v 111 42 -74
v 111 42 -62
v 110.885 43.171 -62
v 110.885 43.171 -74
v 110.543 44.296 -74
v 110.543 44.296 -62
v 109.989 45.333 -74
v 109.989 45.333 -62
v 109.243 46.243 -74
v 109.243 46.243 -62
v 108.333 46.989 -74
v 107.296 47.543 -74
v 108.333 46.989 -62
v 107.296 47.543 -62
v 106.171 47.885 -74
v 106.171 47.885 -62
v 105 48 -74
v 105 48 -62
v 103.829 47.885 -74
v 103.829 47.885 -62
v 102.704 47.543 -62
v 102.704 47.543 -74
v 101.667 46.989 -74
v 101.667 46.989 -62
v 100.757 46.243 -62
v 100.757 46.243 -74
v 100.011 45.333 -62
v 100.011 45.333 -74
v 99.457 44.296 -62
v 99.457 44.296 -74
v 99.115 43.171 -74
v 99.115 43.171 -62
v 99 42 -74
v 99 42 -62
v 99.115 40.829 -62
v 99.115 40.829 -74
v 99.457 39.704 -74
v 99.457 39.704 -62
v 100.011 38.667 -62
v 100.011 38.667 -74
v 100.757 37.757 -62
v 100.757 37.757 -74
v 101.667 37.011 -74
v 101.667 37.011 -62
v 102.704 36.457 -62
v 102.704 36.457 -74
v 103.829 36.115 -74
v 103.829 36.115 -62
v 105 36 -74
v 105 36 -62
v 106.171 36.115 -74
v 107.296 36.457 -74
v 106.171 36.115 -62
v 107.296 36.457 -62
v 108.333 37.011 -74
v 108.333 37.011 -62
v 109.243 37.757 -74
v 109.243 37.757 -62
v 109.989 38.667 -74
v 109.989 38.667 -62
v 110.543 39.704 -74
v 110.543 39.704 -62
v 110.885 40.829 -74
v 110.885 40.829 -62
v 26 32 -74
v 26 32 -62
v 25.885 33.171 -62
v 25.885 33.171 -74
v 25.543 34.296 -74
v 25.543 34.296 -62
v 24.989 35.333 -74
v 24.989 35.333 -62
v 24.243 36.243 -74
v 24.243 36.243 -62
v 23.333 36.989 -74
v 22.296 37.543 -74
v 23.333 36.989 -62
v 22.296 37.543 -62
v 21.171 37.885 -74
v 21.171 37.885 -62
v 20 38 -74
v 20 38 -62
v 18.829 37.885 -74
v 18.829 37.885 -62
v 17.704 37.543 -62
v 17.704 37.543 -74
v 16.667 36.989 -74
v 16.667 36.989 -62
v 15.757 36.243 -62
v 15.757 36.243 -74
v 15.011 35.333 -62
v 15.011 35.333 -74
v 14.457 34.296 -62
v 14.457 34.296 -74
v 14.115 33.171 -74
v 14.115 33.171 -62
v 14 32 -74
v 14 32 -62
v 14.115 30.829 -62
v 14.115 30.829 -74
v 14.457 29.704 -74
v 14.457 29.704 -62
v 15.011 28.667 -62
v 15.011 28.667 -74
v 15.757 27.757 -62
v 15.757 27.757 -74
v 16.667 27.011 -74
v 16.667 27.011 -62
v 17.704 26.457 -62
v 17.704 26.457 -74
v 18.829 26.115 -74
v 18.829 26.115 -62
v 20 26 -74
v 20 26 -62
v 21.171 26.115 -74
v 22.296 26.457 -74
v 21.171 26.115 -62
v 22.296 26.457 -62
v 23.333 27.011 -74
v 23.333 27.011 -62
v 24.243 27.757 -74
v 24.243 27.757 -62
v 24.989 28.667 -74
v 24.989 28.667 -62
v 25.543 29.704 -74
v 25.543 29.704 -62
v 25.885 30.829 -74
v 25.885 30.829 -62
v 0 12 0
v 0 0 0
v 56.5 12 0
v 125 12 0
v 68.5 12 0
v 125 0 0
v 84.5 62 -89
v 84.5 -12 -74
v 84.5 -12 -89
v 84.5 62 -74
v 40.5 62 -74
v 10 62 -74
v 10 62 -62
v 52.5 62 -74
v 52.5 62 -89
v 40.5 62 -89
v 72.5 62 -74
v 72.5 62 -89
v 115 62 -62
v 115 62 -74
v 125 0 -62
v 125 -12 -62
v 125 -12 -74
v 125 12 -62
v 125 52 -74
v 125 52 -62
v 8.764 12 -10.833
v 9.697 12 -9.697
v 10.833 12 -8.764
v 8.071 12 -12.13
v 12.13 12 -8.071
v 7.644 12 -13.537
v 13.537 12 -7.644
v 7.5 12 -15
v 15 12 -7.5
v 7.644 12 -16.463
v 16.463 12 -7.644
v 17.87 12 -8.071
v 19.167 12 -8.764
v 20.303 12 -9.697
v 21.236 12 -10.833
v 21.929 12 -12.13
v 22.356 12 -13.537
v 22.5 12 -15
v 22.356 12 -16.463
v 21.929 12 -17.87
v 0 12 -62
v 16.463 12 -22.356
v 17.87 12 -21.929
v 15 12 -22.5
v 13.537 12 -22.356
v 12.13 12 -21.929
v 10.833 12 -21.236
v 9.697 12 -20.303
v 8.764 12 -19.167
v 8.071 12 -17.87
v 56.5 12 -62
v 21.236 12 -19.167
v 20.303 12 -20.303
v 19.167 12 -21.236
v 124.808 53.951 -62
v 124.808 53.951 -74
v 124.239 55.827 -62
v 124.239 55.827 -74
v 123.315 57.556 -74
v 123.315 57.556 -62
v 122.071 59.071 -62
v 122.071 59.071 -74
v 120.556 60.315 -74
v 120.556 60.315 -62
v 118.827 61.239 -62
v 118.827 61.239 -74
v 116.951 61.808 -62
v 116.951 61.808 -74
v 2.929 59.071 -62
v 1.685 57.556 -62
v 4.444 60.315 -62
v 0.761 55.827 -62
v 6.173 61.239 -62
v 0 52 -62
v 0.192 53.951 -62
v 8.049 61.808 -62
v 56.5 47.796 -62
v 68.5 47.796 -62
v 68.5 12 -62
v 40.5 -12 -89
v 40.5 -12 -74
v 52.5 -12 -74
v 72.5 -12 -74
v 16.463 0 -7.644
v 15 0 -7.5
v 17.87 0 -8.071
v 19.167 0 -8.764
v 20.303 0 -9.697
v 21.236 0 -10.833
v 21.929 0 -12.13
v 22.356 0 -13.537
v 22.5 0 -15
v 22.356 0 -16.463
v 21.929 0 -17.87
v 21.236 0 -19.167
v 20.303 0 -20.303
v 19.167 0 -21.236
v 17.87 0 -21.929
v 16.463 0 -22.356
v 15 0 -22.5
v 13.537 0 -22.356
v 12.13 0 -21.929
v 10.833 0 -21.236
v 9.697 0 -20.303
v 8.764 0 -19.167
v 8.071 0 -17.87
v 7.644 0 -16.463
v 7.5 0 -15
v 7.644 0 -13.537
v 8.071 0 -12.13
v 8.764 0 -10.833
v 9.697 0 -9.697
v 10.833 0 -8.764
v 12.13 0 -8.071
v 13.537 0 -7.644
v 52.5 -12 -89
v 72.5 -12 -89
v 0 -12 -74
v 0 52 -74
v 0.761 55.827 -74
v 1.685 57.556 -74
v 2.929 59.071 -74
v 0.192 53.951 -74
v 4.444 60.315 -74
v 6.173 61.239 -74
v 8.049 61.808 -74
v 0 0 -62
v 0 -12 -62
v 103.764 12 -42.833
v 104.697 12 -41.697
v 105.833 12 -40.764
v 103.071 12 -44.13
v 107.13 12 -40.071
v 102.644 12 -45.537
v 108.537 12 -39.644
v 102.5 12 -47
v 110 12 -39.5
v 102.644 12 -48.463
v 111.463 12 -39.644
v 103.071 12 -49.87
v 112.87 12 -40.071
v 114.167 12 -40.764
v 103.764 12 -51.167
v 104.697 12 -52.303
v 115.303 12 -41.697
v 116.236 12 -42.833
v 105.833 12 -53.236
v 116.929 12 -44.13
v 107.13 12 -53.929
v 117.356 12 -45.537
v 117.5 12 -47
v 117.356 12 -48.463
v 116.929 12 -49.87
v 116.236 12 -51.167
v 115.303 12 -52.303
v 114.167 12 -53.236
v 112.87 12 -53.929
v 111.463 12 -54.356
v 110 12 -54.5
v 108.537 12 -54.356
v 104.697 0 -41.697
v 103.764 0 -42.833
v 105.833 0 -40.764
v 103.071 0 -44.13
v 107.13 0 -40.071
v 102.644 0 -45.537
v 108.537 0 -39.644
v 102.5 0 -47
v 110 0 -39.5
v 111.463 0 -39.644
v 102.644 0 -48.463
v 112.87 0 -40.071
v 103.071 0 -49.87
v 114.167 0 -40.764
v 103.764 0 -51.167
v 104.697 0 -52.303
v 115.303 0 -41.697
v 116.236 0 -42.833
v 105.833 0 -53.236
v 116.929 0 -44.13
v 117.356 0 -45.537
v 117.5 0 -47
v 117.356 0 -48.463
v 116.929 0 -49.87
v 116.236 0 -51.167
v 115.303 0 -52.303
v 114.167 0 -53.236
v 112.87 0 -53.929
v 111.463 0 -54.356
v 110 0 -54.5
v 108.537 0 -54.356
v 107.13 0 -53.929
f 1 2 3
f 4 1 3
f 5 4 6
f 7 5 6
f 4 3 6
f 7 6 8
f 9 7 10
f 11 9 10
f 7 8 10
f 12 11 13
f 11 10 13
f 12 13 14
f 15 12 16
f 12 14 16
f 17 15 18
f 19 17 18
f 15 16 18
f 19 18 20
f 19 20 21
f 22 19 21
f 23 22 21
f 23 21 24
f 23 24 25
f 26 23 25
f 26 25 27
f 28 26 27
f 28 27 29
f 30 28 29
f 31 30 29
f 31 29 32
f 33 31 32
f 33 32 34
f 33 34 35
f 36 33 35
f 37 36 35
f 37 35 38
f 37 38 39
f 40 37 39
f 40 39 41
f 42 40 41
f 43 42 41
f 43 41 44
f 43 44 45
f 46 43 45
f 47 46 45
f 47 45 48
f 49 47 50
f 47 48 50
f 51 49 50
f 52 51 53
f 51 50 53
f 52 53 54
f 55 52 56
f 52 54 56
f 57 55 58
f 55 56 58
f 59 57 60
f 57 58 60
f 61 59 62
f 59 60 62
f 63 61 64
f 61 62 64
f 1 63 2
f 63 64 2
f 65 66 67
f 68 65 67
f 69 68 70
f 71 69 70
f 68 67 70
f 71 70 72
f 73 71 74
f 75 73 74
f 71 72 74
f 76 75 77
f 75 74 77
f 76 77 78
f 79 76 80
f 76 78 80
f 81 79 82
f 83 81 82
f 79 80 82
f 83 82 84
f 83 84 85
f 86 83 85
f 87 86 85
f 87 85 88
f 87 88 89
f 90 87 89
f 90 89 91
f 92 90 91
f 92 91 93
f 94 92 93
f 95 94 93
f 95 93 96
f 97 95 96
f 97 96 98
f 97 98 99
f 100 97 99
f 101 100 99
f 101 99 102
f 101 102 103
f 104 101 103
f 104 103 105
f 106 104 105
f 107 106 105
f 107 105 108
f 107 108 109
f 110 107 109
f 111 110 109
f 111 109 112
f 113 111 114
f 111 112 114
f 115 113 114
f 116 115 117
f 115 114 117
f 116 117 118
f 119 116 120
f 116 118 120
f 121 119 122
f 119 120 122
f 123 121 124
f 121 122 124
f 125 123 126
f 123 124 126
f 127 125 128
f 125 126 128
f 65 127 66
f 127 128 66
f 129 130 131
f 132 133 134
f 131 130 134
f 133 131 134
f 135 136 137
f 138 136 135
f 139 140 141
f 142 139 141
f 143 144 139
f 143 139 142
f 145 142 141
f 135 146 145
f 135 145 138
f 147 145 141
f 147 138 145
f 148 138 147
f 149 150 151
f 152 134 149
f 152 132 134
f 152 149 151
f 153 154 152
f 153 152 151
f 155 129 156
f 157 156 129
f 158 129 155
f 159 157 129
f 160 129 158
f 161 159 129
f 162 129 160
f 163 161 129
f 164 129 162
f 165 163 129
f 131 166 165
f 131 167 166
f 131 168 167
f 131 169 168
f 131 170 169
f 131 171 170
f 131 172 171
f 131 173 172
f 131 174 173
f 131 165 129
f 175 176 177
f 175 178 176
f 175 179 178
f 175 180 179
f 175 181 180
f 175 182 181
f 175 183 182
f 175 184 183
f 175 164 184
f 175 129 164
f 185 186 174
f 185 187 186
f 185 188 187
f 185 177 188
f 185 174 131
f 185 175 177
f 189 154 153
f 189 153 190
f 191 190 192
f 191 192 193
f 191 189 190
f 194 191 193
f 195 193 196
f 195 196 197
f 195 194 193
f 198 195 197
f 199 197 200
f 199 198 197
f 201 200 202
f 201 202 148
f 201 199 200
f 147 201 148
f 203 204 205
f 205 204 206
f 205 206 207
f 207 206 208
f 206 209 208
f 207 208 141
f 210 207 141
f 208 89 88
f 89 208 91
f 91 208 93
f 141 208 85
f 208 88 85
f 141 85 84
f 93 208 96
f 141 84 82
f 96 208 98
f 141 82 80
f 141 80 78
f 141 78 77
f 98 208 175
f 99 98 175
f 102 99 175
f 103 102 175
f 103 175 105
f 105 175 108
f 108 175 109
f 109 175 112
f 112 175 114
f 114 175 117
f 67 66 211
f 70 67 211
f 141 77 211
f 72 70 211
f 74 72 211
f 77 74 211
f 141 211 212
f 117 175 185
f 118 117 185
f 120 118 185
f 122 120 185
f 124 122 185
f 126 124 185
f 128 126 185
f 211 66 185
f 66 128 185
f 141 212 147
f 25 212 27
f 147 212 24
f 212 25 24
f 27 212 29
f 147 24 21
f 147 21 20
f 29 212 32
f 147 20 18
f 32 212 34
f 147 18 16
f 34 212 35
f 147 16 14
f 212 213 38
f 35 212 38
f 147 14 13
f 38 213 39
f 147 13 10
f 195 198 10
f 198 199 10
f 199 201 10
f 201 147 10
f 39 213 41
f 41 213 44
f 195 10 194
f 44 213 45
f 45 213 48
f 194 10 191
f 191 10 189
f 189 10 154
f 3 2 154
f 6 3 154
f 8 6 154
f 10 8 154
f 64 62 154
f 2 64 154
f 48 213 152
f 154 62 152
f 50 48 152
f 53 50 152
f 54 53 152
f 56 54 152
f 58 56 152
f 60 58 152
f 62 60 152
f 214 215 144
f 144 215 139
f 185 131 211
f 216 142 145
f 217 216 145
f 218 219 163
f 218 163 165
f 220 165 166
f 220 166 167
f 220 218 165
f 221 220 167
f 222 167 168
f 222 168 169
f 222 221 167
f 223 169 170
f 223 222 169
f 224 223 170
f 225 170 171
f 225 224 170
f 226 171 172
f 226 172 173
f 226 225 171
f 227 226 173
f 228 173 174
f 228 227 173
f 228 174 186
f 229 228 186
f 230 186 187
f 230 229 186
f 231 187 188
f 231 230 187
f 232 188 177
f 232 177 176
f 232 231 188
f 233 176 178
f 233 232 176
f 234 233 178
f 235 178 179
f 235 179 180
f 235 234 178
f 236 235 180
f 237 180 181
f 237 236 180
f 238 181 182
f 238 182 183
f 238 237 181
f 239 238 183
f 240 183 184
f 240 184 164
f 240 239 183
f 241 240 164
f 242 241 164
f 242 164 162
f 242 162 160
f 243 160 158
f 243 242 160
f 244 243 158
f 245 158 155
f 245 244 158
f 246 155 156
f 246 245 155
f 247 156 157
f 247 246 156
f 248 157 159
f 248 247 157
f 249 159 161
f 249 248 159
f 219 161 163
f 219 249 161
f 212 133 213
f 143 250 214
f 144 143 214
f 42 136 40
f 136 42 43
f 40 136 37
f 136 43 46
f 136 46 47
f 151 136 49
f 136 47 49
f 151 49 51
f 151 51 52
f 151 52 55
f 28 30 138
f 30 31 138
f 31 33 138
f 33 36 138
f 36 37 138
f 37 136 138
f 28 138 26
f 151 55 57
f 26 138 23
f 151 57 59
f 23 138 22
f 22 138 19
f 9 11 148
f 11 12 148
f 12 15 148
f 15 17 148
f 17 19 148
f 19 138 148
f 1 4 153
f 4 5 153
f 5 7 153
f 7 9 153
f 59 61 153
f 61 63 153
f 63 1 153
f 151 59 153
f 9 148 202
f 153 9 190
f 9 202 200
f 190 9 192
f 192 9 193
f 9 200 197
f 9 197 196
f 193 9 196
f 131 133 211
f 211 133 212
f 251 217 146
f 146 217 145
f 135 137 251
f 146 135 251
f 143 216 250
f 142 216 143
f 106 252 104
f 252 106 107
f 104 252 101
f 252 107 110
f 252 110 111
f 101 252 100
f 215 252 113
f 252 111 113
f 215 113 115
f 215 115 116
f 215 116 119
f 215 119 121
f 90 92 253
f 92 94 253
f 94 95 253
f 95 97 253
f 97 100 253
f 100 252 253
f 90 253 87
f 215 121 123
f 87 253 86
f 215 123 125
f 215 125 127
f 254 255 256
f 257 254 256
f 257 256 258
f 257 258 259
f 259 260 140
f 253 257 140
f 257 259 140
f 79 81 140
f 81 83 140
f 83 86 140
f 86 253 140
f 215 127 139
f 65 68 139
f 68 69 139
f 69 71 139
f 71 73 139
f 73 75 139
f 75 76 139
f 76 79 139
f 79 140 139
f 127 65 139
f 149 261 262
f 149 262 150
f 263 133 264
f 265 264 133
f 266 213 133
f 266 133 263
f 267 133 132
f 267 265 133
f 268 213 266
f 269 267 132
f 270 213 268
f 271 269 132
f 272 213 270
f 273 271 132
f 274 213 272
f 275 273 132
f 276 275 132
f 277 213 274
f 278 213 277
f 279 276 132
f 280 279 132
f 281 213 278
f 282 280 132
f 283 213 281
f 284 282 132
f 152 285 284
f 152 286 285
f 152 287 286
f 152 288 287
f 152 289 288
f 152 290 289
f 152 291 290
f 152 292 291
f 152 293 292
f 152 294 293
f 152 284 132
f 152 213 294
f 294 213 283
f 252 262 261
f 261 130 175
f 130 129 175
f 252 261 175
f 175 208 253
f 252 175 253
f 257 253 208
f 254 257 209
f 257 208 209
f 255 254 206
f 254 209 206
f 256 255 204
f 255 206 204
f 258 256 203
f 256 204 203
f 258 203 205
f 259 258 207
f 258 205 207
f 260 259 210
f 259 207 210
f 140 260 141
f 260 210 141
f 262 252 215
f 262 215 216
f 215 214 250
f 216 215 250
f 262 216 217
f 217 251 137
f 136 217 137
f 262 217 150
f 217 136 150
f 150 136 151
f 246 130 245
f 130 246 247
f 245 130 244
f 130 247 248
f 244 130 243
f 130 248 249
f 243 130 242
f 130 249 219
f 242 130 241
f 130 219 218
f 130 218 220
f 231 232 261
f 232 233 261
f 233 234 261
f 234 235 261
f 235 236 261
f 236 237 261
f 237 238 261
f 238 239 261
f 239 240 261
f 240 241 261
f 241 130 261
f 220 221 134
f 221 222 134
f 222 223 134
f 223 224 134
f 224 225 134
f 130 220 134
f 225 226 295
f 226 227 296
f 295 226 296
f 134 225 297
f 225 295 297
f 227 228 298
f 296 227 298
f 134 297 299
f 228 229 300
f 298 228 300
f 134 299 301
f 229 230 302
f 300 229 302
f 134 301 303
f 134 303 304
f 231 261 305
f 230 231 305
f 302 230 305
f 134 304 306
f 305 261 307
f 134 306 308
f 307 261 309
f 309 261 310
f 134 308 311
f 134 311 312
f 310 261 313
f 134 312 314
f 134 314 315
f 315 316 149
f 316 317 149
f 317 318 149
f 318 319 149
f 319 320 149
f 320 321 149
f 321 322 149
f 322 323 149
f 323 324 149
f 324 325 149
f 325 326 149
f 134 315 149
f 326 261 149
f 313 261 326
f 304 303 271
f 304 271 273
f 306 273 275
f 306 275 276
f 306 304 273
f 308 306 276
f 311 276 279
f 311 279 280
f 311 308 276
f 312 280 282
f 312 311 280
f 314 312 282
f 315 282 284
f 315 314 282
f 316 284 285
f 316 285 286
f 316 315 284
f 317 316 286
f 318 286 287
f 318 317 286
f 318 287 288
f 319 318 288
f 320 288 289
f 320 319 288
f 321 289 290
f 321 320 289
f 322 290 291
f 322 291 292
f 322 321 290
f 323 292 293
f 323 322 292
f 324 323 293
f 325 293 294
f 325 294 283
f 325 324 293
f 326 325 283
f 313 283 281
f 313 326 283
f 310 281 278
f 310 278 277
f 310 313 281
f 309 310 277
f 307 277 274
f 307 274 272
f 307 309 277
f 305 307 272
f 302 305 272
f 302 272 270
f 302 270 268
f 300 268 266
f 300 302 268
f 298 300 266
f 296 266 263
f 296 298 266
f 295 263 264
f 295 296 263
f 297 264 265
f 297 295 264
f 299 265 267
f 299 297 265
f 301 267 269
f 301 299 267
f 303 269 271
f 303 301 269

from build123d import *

# Parameters (mm, degrees)
SKETCH1_W           = 125
SKETCH1_H           = 62
SKETCH1_R           = 7.5
BOSS_EXTRUDE2_DEPTH = 12
SKETCH1_3_W         = 125
SKETCH1_3_H         = 12
BOSS_EXTRUDE3_DEPTH = 62
SKETCH1_4_W         = 125
SKETCH1_4_H         = 12
BOSS_EXTRUDE4_DEPTH = 12
CUT_EXTRUDE1_REACH  = 154.686
SKETCH3_R           = 6
SKETCH4_W           = 12
SKETCH4_H           = 74
BOSS_EXTRUDE5_DEPTH = 15
SKETCH5_W           = 12
SKETCH5_H           = 62
BOSS_EXTRUDE6_DEPTH = 50
CUT_EXTRUDE2_REACH  = 130.286


with BuildPart() as part:
    # Sketch1 → Boss-Extrude2 (new body)
    with BuildSketch(Plane(origin=(0, 0, 0), x_dir=(1, 0, 0), z_dir=(0, 1, 0))):
        with Locations((62.5, 31)):
            Rectangle(SKETCH1_W, SKETCH1_H)
        with Locations((15, 15)):
            Circle(SKETCH1_R, mode=Mode.SUBTRACT)
        with Locations((110, 47)):
            Circle(SKETCH1_R, mode=Mode.SUBTRACT)
    extrude(amount=BOSS_EXTRUDE2_DEPTH)

    # Sketch1<3> → Boss-Extrude3 (add)
    with BuildSketch(Plane(origin=(0, 0, 0), x_dir=(1, 0, 0), z_dir=(0, 1, 0))):
        with Locations((62.5, 68)):
            Rectangle(SKETCH1_3_W, SKETCH1_3_H)
    extrude(amount=BOSS_EXTRUDE3_DEPTH)

    # Sketch1<4> → Boss-Extrude4 (add)
    with BuildSketch(Plane(origin=(0, 0, 0), x_dir=(1, 0, 0), z_dir=(0, 1, 0))):
        with Locations((62.5, 68)):
            Rectangle(SKETCH1_4_W, SKETCH1_4_H)
    extrude(amount=-BOSS_EXTRUDE4_DEPTH)

    # Sketch3 → Cut-Extrude1 (cut, up to next)
    with BuildSketch(Plane.XY.offset(-62), mode=Mode.PRIVATE) as cut_extrude1_sk1:
        with Locations((105, 42)):
            Circle(SKETCH3_R)
    cut_extrude1_tool1 = extrude(cut_extrude1_sk1.sketch, amount=-CUT_EXTRUDE1_REACH, mode=Mode.PRIVATE) & part.part
    # Sketch3 → Cut-Extrude1 (cut, up to next)
    with BuildSketch(Plane.XY.offset(-62), mode=Mode.PRIVATE) as cut_extrude1_sk2:
        with Locations((20, 32)):
            Circle(SKETCH3_R)
    cut_extrude1_tool2 = extrude(cut_extrude1_sk2.sketch, amount=-CUT_EXTRUDE1_REACH, mode=Mode.PRIVATE) & part.part
    # Sketch3 → Cut-Extrude1 (cut, up to next)
    with BuildSketch(Plane.XY.offset(-62), mode=Mode.PRIVATE) as cut_extrude1_sk3:
        with BuildLine():
            Line((115, 62), (125, 62))
            Line((125, 62), (125, 52))
            ThreePointArc((125, 52), (122.071067812, 59.071067812), (115, 62))
        make_face()
    cut_extrude1_tool3 = extrude(cut_extrude1_sk3.sketch, amount=-CUT_EXTRUDE1_REACH, mode=Mode.PRIVATE) & part.part
    # Sketch3 → Cut-Extrude1 (cut, up to next)
    with BuildSketch(Plane.XY.offset(-62), mode=Mode.PRIVATE) as cut_extrude1_sk4:
        with BuildLine():
            Line((0, 62), (0, 52))
            ThreePointArc((0, 52), (2.928932188, 59.071067812), (10, 62))
            Line((10, 62), (0, 62))
        make_face()
    cut_extrude1_tool4 = extrude(cut_extrude1_sk4.sketch, amount=-CUT_EXTRUDE1_REACH, mode=Mode.PRIVATE) & part.part
    add(cut_extrude1_tool1.solids().sort_by_distance((105, 42, -62))[0], mode=Mode.SUBTRACT)
    add(cut_extrude1_tool2.solids().sort_by_distance((20, 32, -62))[0], mode=Mode.SUBTRACT)
    add(cut_extrude1_tool3.solids().sort_by_distance((122.766321, 59.766321, -62))[0], mode=Mode.SUBTRACT)
    add(cut_extrude1_tool4.solids().sort_by_distance((2.233679, 59.766321, -62))[0], mode=Mode.SUBTRACT)

    # Sketch4 → Boss-Extrude5 (add)
    with BuildSketch(Plane(origin=(0, 0, -74), x_dir=(-1, 0, 0), z_dir=(0, 0, -1))):
        with Locations((-78.5, 25)):
            Rectangle(SKETCH4_W, SKETCH4_H)
        with Locations((-46.5, 25)):
            Rectangle(SKETCH4_W, SKETCH4_H)
    extrude(amount=BOSS_EXTRUDE5_DEPTH)

    # Sketch5 → Boss-Extrude6 (add)
    with BuildSketch(Plane(origin=(0, 12, 0), x_dir=(1, 0, 0), z_dir=(0, 1, 0))):
        with Locations((62.5, 31)):
            Rectangle(SKETCH5_W, SKETCH5_H)
    extrude(amount=BOSS_EXTRUDE6_DEPTH)

    # Sketch6 → Cut-Extrude2 (cut, up to next)
    with BuildSketch(Plane(origin=(68.5, 0, 0), x_dir=(0, 0, -1), z_dir=(1, 0, 0)), mode=Mode.PRIVATE) as cut_extrude2_sk1:
        Polygon((0, 12), (62, 47.79571669), (62, 62), (0, 62), align=None)
    cut_extrude2_tool1 = extrude(cut_extrude2_sk1.sketch, amount=-CUT_EXTRUDE2_REACH, mode=Mode.PRIVATE) & part.part
    add(cut_extrude2_tool1.solids().sort_by_distance((68.5, 44.285835, -25.238872))[0], mode=Mode.SUBTRACT)


solid = part.part
